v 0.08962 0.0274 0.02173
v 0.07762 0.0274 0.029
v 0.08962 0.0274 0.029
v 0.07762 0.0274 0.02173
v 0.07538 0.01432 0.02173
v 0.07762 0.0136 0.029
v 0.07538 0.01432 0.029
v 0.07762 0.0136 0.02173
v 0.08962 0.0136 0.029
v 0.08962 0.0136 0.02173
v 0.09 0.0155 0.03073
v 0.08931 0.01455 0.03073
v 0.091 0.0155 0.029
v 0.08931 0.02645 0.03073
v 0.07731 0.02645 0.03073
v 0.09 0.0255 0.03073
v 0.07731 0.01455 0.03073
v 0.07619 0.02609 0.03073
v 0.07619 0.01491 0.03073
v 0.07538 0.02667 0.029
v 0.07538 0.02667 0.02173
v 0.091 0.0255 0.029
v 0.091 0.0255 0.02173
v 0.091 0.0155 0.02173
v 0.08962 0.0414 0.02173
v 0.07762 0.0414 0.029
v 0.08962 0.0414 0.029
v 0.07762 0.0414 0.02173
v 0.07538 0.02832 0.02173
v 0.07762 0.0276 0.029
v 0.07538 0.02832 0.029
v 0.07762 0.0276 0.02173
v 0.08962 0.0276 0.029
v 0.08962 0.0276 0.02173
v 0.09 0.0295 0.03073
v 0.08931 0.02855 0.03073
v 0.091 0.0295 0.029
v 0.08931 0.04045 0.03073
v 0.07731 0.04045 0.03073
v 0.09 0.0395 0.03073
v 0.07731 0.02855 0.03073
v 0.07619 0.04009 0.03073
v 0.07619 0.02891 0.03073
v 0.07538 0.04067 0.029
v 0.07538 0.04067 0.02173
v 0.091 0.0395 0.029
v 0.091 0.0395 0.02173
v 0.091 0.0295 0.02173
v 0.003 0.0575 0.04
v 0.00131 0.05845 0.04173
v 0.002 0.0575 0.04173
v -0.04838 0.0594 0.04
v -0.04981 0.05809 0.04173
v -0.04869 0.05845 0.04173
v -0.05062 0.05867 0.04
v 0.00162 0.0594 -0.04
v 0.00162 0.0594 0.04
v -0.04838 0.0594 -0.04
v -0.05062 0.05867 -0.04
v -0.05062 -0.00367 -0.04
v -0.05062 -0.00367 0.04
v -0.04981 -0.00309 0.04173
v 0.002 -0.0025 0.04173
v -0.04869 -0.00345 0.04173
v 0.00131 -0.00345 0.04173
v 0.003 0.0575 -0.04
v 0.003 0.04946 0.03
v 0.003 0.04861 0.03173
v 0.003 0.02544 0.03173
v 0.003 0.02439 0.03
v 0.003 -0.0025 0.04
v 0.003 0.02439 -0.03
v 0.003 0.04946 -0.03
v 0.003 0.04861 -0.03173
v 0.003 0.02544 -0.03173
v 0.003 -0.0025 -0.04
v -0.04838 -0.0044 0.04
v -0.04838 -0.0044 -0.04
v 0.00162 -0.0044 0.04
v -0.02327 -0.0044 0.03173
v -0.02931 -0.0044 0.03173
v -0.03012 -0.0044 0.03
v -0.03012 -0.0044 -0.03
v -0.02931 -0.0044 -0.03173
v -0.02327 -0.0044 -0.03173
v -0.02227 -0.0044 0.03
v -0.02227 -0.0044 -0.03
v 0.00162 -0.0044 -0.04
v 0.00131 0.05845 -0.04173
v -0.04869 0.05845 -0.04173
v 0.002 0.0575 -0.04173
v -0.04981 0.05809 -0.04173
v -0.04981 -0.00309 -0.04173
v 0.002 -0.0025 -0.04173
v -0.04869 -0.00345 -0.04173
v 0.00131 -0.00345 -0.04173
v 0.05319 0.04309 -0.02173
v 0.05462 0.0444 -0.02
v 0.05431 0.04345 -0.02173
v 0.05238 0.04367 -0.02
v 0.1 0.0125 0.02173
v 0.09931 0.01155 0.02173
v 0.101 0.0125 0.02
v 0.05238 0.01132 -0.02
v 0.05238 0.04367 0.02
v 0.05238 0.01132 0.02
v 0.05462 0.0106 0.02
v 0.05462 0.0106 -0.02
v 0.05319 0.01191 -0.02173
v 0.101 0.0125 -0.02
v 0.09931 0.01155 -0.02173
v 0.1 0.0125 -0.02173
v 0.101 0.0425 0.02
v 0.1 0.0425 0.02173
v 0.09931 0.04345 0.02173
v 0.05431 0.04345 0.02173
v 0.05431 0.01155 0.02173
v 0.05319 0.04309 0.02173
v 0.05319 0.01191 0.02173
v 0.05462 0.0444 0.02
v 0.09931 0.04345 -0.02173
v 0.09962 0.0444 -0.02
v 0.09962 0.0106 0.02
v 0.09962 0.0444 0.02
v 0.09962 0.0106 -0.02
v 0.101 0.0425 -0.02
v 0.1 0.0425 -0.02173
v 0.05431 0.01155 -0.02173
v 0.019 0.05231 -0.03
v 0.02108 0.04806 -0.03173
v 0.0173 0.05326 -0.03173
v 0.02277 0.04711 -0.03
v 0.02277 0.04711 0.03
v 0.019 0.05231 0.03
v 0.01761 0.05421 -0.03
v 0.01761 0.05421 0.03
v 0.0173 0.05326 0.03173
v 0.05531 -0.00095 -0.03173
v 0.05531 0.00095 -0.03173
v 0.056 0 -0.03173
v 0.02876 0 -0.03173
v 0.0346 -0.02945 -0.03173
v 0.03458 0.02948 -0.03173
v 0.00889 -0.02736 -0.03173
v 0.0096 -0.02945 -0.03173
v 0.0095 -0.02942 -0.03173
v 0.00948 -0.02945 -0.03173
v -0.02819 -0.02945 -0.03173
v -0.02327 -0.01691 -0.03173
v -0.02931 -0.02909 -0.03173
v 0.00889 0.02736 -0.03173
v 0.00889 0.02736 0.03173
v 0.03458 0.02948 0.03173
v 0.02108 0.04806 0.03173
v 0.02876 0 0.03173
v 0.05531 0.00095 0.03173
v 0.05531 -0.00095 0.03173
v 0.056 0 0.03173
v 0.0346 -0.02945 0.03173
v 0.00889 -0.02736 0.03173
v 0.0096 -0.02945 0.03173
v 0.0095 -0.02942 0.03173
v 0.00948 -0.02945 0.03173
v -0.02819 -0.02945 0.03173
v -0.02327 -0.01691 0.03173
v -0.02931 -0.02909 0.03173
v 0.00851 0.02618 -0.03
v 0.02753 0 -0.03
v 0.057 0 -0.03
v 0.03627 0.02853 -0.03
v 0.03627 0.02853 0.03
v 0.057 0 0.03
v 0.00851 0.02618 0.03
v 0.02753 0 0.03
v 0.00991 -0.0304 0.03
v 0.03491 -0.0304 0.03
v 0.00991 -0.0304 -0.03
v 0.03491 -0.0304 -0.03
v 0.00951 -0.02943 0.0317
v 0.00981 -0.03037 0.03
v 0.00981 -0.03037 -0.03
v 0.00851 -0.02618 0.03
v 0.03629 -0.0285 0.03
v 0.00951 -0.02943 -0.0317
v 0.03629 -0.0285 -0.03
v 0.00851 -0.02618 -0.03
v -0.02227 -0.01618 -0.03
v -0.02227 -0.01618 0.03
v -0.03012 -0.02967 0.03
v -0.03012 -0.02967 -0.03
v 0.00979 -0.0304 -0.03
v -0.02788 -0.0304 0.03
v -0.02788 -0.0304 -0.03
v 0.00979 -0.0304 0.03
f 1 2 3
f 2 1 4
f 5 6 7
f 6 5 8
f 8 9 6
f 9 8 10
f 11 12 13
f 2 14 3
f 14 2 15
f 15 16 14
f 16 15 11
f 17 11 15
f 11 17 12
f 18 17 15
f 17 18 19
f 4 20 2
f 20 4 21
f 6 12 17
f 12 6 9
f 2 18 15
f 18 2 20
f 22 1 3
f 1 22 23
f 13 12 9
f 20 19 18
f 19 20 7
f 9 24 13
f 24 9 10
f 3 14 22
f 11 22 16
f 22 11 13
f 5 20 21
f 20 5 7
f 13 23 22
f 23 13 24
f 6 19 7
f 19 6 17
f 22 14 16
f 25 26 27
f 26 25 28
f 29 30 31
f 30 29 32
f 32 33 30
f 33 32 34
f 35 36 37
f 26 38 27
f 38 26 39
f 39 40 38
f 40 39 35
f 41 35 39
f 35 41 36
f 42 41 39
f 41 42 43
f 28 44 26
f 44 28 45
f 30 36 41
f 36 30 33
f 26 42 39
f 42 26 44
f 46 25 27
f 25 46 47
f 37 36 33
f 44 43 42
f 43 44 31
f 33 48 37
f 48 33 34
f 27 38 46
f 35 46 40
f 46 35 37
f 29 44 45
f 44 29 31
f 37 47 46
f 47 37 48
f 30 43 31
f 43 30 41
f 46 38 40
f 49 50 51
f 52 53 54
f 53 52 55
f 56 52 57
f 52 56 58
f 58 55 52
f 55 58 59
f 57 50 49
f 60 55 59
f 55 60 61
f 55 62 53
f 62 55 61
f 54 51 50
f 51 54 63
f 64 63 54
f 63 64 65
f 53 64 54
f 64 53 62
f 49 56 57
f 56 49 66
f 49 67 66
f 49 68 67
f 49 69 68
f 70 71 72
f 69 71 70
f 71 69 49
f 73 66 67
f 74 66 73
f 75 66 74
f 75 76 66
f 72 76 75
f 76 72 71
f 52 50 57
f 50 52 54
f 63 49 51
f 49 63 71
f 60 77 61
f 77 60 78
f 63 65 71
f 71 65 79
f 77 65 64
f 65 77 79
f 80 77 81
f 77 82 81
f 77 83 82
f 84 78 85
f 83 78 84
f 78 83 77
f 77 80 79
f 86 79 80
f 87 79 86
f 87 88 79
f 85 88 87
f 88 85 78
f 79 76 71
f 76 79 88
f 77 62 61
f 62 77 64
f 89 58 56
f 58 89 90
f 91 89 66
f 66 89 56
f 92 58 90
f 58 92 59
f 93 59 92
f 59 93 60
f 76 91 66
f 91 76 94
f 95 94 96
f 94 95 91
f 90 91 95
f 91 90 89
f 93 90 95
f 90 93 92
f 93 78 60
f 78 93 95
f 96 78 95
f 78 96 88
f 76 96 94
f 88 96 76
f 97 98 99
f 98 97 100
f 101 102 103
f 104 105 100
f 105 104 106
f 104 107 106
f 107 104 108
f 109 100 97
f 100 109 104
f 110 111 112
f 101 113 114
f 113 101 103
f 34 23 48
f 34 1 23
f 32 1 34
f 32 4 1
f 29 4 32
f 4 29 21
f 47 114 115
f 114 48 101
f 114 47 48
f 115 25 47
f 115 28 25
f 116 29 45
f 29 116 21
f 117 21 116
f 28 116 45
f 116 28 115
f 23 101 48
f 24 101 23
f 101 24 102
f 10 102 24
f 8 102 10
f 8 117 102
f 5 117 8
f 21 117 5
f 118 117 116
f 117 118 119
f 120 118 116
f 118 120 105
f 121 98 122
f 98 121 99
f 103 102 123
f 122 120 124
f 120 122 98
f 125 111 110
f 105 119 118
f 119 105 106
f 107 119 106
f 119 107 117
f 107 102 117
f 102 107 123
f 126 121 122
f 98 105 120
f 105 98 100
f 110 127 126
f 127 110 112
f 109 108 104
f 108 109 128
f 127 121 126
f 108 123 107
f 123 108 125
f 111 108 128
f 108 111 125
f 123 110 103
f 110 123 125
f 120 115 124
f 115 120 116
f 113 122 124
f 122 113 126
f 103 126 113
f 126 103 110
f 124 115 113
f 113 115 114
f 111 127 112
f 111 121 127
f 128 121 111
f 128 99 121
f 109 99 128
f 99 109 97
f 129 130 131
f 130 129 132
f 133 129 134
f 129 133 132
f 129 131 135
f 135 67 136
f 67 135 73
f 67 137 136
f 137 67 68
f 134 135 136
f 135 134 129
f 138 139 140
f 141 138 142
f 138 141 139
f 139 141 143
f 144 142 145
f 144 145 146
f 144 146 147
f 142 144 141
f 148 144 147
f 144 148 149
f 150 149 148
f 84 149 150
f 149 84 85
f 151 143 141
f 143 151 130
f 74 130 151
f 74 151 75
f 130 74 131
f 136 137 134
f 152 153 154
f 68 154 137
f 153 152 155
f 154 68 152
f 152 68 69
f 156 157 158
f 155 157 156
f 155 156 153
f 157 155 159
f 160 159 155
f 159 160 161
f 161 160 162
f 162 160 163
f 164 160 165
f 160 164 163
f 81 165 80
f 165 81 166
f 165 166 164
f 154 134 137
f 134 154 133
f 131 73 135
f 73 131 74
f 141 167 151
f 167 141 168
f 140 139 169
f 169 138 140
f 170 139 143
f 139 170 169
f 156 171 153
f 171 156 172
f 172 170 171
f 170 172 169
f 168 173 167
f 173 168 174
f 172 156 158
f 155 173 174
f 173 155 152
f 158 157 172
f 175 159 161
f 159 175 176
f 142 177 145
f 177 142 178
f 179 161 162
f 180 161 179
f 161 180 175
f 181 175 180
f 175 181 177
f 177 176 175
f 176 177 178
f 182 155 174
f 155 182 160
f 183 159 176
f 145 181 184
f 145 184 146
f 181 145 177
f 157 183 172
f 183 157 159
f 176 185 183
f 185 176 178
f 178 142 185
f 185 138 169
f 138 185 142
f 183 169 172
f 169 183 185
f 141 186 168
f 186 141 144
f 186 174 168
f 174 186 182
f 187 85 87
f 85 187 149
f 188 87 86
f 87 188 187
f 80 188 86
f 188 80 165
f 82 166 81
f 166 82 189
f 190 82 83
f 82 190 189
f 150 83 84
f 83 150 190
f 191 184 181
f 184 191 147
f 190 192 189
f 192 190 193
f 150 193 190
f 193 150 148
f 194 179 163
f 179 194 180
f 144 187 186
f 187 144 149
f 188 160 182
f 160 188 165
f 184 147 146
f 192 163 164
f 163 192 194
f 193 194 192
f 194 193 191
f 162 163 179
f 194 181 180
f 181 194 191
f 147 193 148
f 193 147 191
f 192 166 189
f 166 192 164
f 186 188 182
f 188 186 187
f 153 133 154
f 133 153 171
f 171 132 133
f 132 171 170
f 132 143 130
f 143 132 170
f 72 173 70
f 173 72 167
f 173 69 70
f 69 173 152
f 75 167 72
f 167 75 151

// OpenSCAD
// Parameters
bbox_x = 0.15; //[0.075:0.3:0.001]
bbox_y = 0.13; //[0.065:0.26:0.001]
bbox_z = 0.08; //[0.04:0.16:0.001]
curve_outer_r = 0.055; //[0.0275:0.11:0.001]
curve_inner_r = 0.03; //[0.015:0.06:0.001]
curve_thickness_z = 0.06; //[0.03:0.12:0.001]
large_block_x = 0.05; //[0.025:0.1:0.001]
large_block_y = 0.06; //[0.03:0.12:0.001]
large_block_z = 0.08; //[0.04:0.16:0.001]
tongue_x = 0.045; //[0.0225:0.09:0.001]
tongue_y = 0.03; //[0.015:0.06:0.001]
tongue_z = 0.04; //[0.02:0.08:0.001]
endcap_len = 0.03; //[0.015:0.06:0.001]
endcap_w = 0.028; //[0.014:0.056:0.001]
endcap_z = 0.04; //[0.02:0.08:0.001]
lug_x = 0.012; //[0.006:0.024:0.001]
lug_y = 0.01; //[0.005:0.02:0.001]
lug_z = 0.01; //[0.005:0.02:0.001]
lug_spacing_y = 0.014; //[0.007:0.028:0.001]
lug_offset_from_tip_x = 0.01; //[0.005:0.02:0.001]
overlap = 0.001; //[0.0005:0.002:0.0001]
fillet_r = 0.002; //[0.001:0.004:0.0005]
detail_mark_r = 0.0015; //[0.0008:0.003:0.0001]
detail_mark_h = 0.001; //[0.0005:0.002:0.0001]

// Base Shapes
module curved_main_body_outer_cyl() {
  translate([0, 0, 0])
    cylinder(r=curve_outer_r, h=curve_thickness_z, center=true);
}

module curved_main_body_inner_cyl() {
  translate([0, 0, 0])
    cylinder(r=curve_inner_r, h=curve_thickness_z + 2*overlap, center=true);
}

module curved_main_body_quadrant_keep() {
  translate([curve_outer_r/2, curve_outer_r/2, 0])
    cube([2*curve_outer_r + 2*overlap, 2*curve_outer_r + 2*overlap, curve_thickness_z + 2*overlap], center=true);
}

module large_end_block_interface() {
  translate([-(large_block_x/2) + overlap, curve_outer_r/2, 0])
    cube([large_block_x, large_block_y, large_block_z], center=true);
}

module small_end_tongue_interface() {
  translate([curve_outer_r - overlap + tongue_x/2, curve_outer_r/2, 0])
    cube([tongue_x, tongue_y, tongue_z], center=true);
}

module obround_end_cap_box() {
  translate([curve_outer_r - overlap + tongue_x - endcap_len/2, curve_outer_r/2, 0])
    cube([endcap_len - endcap_w, endcap_w, endcap_z], center=true);
}

module obround_end_cap_cyl_left() {
  translate([curve_outer_r - overlap + tongue_x - endcap_len/2 - (endcap_len - endcap_w)/2, curve_outer_r/2, 0])
    cylinder(r=endcap_w/2, h=endcap_z, center=true);
}

module obround_end_cap_cyl_right() {
  translate([curve_outer_r - overlap + tongue_x - endcap_len/2 + (endcap_len - endcap_w)/2, curve_outer_r/2, 0])
    cylinder(r=endcap_w/2, h=endcap_z, center=true);
}

module top_lug_1() {
  translate([curve_outer_r - overlap + tongue_x - lug_offset_from_tip_x - lug_x/2, curve_outer_r/2 + lug_spacing_y/2, tongue_z/2 + lug_z/2 - overlap])
    cube([lug_x, lug_y, lug_z], center=true);
}

module top_lug_2() {
  translate([curve_outer_r - overlap + tongue_x - lug_offset_from_tip_x - lug_x/2, curve_outer_r/2 - lug_spacing_y/2, tongue_z/2 + lug_z/2 - overlap])
    cube([lug_x, lug_y, lug_z], center=true);
}

module surface_detail_marks() {
  translate([curve_outer_r - overlap + tongue_x/2, curve_outer_r/2, tongue_z/2 + detail_mark_h/2 - overlap])
    cylinder(r=detail_mark_r, h=detail_mark_h, center=true);
}

module edge_fillets_kernel_sphere() {
  translate([0, 0, 0])
    sphere(r=fillet_r, center=true);
}

// Operations
module curved_main_body_ring() {
  difference() {
    curved_main_body_outer_cyl();
    curved_main_body_inner_cyl();
  }
}

module curved_main_body() {
  intersection() {
    curved_main_body_ring();
    curved_main_body_quadrant_keep();
  }
}

module obround_end_cap_feature() {
  union() {
    obround_end_cap_box();
    obround_end_cap_cyl_left();
    obround_end_cap_cyl_right();
  }
}

module main_union_raw() {
  union() {
    curved_main_body();
    large_end_block_interface();
    small_end_tongue_interface();
    obround_end_cap_feature();
    top_lug_1();
    top_lug_2();
    surface_detail_marks();
  }
}

// Final Output
minkowski() {
  main_union_raw();
  edge_fillets_kernel_sphere();
}
